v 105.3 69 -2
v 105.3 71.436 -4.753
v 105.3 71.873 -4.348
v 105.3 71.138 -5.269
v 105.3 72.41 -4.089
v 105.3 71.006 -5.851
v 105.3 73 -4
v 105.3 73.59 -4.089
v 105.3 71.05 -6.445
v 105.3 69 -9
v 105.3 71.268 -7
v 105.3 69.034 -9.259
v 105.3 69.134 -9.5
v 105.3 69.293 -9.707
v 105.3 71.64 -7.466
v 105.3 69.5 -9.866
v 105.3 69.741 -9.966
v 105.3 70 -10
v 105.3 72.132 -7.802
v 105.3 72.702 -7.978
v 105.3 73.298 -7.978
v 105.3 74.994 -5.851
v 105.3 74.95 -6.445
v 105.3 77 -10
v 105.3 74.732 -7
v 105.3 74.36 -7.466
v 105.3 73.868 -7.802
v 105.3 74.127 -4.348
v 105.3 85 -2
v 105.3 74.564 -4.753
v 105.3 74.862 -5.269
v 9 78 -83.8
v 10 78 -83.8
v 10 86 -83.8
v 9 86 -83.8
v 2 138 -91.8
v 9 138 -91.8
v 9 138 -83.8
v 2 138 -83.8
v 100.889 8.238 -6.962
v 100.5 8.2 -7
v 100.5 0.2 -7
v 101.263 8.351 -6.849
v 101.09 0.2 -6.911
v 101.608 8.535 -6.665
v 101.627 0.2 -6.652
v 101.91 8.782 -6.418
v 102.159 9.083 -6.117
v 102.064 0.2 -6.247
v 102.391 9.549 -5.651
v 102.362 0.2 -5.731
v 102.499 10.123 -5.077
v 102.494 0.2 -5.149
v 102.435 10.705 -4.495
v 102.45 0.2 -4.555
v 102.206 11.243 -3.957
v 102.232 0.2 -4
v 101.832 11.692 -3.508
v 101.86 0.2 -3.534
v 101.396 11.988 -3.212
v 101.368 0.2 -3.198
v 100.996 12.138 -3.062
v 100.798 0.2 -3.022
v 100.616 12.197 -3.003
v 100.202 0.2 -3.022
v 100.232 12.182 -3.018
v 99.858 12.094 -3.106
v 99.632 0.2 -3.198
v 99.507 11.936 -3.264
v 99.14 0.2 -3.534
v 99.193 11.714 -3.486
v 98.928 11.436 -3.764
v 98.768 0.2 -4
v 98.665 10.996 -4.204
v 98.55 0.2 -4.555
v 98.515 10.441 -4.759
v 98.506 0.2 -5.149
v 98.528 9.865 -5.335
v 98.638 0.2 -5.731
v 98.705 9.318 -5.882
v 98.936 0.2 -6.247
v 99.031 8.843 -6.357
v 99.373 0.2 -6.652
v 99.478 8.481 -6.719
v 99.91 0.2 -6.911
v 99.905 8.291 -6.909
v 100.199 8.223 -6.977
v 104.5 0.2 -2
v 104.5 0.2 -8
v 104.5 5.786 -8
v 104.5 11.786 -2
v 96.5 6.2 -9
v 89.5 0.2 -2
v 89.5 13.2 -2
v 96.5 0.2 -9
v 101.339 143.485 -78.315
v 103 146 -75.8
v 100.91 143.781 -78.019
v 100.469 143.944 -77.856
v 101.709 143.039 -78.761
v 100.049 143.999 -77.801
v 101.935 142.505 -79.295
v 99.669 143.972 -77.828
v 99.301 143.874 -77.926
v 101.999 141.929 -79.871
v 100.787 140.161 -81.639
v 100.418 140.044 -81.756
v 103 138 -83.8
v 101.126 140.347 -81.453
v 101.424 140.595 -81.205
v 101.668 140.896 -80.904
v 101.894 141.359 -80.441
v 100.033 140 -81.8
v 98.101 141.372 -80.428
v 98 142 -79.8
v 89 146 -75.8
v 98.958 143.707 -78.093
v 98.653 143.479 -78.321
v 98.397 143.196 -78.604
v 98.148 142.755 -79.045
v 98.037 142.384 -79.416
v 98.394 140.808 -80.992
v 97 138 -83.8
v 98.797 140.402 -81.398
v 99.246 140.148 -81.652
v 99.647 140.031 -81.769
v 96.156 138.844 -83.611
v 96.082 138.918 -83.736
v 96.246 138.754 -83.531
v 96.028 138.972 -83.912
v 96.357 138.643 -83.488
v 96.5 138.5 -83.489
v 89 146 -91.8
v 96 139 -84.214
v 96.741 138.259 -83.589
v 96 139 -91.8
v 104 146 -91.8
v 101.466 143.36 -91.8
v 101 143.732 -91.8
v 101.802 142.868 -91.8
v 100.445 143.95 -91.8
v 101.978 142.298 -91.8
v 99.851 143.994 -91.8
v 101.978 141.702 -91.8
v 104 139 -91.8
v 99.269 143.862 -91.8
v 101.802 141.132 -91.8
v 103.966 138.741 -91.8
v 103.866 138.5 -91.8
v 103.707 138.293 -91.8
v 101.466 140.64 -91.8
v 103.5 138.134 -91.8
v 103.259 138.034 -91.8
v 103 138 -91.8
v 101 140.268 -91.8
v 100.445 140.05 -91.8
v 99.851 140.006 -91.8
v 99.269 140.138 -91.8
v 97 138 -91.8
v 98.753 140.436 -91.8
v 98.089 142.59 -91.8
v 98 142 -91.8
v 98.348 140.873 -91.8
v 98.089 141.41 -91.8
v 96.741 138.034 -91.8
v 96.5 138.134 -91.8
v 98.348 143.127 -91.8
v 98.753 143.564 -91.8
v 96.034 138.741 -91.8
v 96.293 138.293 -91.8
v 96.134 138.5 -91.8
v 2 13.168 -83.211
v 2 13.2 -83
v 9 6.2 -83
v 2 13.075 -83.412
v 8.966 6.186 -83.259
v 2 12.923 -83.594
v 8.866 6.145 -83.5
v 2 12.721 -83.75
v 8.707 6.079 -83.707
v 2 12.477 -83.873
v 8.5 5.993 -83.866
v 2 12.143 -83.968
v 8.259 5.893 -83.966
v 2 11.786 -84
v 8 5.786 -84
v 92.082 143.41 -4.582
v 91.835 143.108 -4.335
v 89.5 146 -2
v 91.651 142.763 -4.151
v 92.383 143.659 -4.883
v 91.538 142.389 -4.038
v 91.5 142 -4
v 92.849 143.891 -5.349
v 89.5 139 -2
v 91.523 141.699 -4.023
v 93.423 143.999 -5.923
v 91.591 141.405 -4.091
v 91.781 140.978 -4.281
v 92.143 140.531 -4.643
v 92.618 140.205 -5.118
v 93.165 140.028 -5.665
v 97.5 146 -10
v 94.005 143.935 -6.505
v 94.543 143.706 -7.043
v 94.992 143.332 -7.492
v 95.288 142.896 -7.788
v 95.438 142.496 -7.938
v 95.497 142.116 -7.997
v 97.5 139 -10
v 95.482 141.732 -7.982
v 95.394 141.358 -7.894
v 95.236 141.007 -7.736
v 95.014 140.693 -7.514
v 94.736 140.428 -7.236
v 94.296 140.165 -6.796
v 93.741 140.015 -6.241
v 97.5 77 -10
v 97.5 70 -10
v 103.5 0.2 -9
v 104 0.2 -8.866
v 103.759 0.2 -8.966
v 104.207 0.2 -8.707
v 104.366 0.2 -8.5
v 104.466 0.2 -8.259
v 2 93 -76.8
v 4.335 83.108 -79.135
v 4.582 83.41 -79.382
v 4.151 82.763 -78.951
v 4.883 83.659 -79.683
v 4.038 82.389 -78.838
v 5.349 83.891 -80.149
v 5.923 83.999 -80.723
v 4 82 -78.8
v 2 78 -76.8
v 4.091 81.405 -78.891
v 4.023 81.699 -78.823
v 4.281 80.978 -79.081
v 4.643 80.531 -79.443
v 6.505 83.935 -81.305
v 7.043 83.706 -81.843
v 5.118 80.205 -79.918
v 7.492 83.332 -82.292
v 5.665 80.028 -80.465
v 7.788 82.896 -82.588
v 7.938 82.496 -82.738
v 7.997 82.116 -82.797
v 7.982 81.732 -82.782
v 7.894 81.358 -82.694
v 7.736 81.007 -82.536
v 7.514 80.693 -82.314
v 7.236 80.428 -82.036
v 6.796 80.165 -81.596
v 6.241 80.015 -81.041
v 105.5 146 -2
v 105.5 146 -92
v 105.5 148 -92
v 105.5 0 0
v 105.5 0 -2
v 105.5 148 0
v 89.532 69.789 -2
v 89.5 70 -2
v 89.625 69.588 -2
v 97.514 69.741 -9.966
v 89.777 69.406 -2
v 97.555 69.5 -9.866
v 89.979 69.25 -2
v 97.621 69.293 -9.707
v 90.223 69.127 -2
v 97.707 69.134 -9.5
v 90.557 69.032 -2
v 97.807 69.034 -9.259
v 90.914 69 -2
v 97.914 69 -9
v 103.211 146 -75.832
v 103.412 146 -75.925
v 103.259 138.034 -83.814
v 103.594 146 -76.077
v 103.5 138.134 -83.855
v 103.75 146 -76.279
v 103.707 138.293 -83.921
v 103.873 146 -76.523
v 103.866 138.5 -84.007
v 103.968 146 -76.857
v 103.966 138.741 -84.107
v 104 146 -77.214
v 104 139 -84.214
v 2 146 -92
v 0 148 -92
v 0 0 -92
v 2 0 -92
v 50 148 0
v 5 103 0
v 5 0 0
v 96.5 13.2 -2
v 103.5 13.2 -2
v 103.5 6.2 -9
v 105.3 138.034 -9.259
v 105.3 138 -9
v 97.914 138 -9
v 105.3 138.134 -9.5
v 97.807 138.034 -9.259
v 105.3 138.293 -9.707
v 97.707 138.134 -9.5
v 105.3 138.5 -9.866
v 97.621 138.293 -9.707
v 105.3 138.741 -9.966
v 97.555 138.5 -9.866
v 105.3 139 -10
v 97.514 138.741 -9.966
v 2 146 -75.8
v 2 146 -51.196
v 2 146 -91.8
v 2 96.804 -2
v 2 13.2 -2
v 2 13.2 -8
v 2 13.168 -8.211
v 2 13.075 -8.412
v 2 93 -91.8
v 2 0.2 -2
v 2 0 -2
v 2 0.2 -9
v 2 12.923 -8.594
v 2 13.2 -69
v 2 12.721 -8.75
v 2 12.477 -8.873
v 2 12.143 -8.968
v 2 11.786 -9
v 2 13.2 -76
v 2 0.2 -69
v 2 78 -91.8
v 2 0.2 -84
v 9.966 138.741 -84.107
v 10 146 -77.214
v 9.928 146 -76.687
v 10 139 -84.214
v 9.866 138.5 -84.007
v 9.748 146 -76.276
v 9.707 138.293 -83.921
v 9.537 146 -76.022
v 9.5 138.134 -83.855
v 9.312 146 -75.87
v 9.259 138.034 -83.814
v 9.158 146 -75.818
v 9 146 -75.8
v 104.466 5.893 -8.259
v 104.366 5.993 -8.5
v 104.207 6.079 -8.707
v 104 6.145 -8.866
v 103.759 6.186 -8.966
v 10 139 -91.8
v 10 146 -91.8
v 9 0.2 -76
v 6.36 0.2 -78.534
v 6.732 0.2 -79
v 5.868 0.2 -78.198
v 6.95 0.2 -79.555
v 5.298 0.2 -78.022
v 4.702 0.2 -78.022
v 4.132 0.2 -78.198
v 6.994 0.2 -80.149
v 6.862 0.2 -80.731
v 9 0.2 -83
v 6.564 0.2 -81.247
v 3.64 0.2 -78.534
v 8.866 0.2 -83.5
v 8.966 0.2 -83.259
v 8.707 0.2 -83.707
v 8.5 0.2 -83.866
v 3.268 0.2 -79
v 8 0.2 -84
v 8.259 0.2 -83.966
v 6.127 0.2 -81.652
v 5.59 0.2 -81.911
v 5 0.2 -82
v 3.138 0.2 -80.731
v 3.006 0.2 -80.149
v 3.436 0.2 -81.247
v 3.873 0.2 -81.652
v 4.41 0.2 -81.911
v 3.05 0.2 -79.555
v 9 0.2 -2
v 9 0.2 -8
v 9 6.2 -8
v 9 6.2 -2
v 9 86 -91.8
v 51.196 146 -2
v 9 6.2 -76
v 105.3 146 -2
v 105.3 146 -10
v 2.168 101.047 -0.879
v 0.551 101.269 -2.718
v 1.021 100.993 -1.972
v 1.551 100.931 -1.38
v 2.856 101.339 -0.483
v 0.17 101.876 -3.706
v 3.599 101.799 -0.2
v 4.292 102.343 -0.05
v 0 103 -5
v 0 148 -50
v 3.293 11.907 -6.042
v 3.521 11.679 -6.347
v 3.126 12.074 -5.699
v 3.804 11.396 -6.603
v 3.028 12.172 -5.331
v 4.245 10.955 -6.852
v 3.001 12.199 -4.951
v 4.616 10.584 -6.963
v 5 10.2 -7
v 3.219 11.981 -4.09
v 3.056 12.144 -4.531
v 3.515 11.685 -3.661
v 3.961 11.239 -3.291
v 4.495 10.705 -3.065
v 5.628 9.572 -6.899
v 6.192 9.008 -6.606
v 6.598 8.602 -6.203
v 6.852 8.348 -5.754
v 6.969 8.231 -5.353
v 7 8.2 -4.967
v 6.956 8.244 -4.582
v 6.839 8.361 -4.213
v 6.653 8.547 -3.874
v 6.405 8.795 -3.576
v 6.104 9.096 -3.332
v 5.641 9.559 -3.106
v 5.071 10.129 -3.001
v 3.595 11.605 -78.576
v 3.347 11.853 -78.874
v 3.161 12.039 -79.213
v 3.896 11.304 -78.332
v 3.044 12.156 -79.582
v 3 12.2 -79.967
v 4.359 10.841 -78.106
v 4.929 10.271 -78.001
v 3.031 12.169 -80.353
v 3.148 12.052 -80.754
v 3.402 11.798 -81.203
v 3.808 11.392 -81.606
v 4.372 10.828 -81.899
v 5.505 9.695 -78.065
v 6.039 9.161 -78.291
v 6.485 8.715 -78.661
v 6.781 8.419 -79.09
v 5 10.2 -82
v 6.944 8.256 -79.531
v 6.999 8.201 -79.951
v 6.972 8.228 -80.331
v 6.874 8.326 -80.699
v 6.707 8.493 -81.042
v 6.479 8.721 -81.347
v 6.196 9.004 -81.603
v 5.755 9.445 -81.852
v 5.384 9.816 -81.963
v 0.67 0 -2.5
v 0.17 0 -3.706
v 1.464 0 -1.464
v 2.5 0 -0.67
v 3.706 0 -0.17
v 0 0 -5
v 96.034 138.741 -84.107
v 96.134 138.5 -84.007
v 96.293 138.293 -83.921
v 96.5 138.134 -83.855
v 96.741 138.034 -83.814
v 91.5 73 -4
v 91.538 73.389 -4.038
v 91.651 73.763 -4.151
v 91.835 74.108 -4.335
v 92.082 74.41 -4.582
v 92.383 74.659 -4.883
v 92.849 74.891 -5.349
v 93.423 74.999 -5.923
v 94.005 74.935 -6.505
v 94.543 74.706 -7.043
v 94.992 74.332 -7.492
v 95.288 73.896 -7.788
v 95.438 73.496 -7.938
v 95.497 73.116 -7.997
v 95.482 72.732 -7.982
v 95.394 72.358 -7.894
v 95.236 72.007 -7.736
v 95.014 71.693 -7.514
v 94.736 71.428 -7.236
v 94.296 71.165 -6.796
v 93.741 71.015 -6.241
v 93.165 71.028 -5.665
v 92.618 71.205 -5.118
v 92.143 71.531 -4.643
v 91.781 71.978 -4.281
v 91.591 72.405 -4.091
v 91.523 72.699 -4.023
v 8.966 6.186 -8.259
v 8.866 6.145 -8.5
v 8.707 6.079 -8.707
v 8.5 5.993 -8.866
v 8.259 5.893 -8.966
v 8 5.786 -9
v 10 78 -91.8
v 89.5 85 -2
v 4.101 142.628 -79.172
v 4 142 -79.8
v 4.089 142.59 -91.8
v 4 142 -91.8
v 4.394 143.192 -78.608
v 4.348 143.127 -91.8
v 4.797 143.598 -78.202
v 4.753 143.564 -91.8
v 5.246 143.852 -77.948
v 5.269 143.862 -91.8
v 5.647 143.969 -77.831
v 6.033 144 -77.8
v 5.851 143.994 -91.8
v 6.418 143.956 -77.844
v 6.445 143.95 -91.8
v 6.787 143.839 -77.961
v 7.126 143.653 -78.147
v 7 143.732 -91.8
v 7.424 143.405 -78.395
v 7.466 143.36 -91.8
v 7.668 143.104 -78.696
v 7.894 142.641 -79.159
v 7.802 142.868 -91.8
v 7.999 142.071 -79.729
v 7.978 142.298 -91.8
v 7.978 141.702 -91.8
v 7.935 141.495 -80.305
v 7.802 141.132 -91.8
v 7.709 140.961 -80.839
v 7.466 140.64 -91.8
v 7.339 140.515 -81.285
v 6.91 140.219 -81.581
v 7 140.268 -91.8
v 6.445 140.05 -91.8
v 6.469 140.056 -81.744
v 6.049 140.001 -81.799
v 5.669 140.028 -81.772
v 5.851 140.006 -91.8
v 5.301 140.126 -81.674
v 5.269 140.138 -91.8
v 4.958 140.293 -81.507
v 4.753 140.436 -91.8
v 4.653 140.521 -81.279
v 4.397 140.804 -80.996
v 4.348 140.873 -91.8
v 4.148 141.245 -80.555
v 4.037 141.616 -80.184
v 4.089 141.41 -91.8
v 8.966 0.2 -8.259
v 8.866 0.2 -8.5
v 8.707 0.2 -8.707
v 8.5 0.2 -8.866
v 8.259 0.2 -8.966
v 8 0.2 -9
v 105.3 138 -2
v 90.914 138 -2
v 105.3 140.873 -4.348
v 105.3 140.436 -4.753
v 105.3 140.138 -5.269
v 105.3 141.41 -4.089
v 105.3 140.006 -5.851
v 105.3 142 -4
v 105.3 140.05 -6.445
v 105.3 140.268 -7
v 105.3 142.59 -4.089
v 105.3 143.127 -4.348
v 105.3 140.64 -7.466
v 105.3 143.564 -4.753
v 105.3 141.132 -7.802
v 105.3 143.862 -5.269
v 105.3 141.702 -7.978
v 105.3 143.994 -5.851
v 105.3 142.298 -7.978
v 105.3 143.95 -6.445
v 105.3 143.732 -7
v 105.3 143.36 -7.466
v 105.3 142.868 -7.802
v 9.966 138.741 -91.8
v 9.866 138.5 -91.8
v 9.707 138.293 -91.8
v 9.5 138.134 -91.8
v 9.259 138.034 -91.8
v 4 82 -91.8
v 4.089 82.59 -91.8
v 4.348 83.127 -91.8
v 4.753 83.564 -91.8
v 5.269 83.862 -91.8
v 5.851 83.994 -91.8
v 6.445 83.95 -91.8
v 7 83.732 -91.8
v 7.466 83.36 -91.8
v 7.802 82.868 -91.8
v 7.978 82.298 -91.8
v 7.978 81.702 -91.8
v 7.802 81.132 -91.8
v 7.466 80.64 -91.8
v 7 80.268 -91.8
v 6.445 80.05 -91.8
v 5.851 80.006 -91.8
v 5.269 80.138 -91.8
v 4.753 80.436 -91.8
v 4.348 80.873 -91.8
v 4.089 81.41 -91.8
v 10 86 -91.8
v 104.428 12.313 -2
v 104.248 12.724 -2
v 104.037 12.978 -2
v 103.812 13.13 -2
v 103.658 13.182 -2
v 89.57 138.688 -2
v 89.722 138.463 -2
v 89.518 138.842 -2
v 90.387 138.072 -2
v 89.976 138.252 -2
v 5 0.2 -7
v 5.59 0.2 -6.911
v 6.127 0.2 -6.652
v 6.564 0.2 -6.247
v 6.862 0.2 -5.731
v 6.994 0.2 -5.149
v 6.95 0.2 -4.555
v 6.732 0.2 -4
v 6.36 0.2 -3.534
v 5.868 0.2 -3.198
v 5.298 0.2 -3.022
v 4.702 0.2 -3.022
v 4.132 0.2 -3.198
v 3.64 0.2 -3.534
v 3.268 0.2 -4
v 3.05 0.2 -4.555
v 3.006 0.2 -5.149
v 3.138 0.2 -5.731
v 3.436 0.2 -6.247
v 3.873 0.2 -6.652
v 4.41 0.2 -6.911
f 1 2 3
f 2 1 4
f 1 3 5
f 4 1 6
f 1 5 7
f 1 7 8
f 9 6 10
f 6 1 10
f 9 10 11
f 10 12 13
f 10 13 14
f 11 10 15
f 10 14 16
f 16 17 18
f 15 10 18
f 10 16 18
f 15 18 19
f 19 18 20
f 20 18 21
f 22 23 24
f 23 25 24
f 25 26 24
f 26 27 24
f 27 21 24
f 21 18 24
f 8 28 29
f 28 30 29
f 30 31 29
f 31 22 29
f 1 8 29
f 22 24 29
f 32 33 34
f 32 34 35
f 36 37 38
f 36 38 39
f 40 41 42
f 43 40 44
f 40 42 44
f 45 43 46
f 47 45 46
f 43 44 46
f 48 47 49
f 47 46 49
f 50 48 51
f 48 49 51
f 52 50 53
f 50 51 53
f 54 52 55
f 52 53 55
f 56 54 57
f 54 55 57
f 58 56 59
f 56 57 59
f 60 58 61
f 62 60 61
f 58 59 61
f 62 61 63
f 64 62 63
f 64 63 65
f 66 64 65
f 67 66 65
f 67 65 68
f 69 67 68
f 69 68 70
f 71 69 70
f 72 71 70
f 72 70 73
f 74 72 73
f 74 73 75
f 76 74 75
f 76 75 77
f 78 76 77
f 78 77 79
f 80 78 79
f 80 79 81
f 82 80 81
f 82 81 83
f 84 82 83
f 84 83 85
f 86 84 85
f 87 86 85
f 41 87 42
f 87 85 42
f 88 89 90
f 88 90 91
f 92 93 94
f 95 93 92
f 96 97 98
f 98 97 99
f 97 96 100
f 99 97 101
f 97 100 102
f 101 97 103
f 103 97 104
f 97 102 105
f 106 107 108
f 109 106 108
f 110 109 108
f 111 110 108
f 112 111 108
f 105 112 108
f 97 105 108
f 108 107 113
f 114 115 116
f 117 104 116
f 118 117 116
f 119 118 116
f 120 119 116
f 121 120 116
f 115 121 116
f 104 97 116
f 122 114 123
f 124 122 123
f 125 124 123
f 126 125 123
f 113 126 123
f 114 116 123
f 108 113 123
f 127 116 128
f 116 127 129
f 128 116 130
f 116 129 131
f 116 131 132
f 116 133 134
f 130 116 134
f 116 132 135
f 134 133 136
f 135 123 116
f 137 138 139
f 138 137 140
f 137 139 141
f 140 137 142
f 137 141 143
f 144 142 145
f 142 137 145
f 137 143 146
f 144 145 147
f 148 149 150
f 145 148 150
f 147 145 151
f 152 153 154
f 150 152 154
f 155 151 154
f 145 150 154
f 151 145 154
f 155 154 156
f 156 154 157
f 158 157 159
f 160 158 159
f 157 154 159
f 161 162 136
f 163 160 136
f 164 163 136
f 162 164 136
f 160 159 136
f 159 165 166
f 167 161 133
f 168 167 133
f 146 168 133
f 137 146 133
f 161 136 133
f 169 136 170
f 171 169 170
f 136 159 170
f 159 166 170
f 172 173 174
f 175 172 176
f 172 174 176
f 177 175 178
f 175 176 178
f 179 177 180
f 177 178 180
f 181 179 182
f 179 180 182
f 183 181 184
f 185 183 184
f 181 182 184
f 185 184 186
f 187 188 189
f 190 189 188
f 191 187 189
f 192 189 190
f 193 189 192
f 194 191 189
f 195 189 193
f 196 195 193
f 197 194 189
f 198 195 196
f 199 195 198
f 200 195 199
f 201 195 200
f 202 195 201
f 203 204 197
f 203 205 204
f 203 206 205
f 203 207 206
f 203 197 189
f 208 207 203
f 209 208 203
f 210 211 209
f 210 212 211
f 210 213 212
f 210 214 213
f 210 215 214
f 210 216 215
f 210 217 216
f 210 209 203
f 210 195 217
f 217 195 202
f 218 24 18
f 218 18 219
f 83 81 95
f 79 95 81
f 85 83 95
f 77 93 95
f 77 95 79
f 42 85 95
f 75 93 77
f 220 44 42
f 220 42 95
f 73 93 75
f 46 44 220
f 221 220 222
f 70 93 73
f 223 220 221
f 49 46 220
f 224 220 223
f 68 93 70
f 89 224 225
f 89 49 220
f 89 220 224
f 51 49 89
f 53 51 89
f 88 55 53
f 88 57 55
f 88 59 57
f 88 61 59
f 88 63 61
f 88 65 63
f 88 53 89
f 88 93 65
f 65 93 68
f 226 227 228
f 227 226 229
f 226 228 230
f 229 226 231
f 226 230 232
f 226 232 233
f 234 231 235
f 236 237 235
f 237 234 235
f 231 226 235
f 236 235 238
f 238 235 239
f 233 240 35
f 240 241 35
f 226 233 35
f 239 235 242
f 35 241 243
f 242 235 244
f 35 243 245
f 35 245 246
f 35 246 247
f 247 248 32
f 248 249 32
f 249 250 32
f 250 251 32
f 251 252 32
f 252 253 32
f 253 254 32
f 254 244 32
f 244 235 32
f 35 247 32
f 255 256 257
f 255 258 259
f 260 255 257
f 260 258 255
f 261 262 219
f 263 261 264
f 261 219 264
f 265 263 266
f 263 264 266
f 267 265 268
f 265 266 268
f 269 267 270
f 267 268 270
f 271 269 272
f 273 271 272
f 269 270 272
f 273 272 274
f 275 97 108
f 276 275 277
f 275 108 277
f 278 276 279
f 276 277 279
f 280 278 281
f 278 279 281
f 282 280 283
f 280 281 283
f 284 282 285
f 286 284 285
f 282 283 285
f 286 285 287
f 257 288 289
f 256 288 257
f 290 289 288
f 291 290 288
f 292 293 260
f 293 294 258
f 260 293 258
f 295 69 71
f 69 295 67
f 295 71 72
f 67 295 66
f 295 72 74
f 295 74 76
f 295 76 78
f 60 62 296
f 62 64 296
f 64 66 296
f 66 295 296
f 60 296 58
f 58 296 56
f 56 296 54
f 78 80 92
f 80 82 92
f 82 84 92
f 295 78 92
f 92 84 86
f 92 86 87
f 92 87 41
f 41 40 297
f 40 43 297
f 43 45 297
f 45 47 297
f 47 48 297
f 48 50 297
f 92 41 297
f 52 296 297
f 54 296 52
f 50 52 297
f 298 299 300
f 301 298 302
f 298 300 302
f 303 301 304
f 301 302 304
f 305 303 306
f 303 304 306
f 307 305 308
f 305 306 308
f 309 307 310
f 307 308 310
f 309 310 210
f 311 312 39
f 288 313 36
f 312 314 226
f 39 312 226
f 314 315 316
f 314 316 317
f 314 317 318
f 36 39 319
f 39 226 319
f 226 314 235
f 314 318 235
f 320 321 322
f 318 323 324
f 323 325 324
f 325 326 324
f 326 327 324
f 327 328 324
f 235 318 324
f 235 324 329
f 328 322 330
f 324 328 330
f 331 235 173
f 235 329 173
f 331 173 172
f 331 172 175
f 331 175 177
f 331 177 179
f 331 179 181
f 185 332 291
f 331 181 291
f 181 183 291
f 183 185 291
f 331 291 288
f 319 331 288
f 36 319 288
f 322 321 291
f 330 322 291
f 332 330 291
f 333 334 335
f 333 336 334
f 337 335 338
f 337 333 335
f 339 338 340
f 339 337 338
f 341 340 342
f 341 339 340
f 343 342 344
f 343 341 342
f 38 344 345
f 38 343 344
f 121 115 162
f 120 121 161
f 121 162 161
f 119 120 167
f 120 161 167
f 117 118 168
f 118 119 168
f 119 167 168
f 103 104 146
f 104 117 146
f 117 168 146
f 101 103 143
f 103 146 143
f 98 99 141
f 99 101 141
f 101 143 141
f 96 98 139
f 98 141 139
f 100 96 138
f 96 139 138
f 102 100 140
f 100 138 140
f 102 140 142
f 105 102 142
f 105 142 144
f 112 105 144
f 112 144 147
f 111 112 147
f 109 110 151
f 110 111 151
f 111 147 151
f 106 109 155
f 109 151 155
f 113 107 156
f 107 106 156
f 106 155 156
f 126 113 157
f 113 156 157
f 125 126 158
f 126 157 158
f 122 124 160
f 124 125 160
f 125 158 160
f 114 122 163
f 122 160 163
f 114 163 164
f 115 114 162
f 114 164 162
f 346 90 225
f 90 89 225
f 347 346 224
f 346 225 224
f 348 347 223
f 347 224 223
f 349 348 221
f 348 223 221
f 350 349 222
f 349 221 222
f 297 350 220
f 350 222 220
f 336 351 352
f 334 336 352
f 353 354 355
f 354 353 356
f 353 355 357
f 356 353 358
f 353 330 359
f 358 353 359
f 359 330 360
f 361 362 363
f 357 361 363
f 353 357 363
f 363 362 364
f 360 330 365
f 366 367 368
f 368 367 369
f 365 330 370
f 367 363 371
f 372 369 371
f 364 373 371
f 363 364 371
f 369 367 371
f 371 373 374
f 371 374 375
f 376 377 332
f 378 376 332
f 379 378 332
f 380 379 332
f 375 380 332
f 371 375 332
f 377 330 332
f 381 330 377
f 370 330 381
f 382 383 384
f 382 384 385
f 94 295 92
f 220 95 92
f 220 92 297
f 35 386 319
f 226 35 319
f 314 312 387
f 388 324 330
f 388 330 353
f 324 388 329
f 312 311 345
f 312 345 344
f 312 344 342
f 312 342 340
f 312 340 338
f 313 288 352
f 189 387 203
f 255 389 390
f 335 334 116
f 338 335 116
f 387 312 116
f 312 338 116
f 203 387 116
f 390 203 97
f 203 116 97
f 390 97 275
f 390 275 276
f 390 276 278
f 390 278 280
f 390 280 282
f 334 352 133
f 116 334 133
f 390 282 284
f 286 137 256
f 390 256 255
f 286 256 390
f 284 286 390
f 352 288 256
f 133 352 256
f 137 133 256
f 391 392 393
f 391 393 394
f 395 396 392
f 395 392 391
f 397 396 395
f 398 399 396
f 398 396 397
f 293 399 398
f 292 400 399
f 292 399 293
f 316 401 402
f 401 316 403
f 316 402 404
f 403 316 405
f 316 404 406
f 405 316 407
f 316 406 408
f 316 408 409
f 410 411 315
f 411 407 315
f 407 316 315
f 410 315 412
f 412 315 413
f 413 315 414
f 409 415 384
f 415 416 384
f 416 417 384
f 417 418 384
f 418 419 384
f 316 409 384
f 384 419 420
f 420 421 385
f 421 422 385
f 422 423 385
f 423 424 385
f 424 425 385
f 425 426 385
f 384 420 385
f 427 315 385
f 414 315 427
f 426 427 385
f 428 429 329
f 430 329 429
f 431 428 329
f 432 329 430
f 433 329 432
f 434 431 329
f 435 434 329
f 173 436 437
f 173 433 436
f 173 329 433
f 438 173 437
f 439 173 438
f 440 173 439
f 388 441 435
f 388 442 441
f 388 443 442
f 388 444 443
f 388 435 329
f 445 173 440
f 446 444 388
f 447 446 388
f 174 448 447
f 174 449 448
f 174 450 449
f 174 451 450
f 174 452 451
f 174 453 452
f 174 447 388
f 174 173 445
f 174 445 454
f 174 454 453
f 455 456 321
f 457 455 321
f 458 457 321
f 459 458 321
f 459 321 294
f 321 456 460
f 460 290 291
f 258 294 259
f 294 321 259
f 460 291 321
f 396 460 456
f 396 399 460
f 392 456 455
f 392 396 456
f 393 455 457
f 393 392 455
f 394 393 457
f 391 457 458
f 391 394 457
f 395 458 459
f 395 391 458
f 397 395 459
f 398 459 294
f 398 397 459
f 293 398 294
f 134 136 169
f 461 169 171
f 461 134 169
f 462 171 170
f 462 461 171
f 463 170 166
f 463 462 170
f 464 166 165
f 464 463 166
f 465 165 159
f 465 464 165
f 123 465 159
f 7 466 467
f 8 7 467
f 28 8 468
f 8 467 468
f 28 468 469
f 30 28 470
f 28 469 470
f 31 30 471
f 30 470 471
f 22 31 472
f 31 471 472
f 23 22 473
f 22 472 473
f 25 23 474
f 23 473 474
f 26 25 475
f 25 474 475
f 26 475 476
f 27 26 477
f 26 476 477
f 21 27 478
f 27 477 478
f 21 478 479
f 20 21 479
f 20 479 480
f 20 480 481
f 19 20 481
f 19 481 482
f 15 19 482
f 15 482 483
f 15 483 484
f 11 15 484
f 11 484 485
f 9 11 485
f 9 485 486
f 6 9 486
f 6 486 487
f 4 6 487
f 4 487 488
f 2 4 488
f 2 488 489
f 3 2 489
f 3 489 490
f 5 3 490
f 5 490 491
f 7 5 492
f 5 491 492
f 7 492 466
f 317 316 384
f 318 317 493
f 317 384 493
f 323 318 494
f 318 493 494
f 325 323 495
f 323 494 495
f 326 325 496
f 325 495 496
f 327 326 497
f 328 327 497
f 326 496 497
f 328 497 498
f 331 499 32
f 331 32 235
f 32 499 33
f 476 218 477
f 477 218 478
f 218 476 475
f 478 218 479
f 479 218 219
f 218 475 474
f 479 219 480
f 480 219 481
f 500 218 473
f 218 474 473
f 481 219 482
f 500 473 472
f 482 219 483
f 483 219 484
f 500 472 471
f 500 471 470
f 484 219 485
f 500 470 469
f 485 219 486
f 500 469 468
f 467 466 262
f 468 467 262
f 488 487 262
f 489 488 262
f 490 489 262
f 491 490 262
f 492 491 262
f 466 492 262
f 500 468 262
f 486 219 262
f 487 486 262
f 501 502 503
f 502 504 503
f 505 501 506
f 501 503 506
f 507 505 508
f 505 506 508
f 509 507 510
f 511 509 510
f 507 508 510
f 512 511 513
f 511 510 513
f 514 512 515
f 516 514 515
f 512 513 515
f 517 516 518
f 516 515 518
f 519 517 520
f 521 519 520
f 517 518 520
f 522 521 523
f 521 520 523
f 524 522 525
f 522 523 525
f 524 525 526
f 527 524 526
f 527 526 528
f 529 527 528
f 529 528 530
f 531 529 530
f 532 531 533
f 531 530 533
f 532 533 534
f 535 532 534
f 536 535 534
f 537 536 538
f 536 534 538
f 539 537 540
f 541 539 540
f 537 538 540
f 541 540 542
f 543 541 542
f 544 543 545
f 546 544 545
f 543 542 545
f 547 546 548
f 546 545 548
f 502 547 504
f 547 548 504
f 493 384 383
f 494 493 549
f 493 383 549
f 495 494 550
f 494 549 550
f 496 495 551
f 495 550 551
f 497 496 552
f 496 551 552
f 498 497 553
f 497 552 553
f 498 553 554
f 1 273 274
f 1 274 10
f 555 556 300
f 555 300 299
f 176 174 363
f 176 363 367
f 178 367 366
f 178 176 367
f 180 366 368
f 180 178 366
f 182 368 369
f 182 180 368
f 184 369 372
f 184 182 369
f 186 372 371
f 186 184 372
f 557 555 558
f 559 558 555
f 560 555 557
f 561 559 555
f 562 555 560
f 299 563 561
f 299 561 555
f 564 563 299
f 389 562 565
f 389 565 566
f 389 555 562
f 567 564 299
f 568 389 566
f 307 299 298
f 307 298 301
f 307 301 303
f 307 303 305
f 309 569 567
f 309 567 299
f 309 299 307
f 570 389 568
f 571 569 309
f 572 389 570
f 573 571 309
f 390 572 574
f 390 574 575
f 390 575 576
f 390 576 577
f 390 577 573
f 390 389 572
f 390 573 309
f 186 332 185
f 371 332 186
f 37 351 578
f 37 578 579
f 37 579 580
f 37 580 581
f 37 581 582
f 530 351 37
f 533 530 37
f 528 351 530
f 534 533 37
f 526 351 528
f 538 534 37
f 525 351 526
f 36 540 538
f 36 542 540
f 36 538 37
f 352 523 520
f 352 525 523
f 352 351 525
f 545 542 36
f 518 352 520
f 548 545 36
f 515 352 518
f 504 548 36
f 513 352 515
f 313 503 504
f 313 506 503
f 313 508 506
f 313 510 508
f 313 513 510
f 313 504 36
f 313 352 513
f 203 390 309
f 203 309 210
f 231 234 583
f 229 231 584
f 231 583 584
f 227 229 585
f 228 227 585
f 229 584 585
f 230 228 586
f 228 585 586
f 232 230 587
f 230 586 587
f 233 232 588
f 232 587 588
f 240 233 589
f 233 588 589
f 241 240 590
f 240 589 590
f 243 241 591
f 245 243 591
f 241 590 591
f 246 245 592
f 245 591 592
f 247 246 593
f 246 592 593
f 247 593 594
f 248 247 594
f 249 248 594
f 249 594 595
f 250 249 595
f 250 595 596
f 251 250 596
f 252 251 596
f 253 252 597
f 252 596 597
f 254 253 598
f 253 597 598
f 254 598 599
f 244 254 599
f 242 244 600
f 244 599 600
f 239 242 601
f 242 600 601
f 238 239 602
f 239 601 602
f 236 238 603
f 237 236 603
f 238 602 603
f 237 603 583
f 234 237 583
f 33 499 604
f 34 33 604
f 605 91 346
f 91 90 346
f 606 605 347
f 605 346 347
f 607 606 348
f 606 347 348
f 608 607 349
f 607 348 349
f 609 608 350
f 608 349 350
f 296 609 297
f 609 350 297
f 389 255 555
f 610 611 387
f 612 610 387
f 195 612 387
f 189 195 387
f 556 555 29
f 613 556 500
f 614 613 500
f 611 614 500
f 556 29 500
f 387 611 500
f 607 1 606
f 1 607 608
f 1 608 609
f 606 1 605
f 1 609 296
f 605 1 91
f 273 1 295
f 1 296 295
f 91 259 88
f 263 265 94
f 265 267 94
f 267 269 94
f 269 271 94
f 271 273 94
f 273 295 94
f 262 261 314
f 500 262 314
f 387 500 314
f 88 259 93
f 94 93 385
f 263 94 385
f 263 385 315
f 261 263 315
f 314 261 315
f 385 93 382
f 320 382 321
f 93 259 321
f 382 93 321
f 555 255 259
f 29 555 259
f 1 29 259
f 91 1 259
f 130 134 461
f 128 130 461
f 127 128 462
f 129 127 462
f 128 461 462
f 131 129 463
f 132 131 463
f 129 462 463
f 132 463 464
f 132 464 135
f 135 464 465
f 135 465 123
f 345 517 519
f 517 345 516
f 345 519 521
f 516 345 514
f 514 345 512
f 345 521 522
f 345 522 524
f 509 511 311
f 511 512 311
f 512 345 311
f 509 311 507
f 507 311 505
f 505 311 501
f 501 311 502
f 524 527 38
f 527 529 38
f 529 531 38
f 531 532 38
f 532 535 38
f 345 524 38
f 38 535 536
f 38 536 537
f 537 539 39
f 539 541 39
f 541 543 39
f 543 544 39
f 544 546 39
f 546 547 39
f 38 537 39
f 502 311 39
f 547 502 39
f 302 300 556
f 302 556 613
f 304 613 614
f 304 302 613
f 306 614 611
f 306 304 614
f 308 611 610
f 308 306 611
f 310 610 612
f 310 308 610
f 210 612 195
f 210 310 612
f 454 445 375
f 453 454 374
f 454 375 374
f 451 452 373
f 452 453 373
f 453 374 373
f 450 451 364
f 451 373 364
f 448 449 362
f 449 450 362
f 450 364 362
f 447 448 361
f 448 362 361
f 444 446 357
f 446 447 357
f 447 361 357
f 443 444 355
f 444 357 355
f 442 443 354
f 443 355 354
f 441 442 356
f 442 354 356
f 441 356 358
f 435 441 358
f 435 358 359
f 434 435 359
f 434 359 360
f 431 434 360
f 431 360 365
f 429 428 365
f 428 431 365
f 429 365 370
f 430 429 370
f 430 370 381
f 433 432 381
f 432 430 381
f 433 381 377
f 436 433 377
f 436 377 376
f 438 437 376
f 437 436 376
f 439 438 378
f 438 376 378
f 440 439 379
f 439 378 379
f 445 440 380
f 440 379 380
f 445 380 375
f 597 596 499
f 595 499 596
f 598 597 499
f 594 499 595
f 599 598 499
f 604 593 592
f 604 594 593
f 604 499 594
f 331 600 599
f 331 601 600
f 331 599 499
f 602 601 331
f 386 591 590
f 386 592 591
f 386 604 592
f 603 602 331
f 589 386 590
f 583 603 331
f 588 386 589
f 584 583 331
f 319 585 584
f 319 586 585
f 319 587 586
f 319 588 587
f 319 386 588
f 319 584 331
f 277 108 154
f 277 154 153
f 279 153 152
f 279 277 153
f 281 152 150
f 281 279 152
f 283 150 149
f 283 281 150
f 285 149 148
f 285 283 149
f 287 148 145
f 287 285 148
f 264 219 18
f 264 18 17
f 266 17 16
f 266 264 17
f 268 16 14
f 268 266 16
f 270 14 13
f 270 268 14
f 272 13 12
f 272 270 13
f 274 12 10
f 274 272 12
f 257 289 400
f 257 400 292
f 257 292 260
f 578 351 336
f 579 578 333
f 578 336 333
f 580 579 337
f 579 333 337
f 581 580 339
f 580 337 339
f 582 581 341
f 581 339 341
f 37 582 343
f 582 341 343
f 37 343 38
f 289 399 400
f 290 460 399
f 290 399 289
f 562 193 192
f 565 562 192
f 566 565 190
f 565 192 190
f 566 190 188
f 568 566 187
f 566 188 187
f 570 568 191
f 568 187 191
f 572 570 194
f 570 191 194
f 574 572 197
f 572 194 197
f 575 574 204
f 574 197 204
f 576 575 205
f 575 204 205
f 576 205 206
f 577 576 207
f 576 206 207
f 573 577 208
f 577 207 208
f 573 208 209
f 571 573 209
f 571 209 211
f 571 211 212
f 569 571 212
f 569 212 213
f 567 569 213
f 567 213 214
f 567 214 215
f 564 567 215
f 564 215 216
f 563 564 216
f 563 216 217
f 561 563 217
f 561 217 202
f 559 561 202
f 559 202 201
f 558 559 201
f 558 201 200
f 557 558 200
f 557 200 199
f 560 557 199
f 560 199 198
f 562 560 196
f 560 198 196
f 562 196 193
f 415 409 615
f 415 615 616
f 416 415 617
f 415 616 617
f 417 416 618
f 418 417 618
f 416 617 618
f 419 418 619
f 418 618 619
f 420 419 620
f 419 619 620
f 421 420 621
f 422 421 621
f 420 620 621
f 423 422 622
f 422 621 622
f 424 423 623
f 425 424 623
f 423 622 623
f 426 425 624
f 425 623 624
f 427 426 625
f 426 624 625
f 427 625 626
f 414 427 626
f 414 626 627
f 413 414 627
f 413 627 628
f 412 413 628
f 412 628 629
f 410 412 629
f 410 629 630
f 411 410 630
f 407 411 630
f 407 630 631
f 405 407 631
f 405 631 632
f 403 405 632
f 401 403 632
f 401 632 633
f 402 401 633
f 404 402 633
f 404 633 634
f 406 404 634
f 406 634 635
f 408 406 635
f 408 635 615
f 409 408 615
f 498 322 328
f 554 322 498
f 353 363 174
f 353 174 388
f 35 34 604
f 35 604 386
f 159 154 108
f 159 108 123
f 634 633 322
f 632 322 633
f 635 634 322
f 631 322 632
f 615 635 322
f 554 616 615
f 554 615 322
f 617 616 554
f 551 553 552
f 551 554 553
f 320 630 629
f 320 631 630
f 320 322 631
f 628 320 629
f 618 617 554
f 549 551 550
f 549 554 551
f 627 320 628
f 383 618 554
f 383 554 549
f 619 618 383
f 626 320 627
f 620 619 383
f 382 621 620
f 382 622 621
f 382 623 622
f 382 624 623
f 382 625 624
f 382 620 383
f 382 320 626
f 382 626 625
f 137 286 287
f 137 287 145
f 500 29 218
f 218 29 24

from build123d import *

# Parameters (mm, degrees)
BOSS_EXTRUDE1_DEPTH       = 146
SKETCH2_W                 = 105.5
SKETCH2_H                 = 92
BOSS_EXTRUDE2_DEPTH       = 2
BOSS_EXTRUDE3_START       = -0.2
SKETCH3_W                 = 7
SKETCH3_H                 = 8
SKETCH3_R                 = 2
SKETCH3_W_2               = 8
BOSS_EXTRUDE3_DEPTH       = 6
SKETCH4_W                 = 8
SKETCH4_H                 = 8
BOSS_EXTRUDE4_DEPTH       = 8
SKETCH5_W                 = 8
SKETCH5_H                 = 77
CUT_EXTRUDE1_DEPTH        = 0.2
F_4_0MM_DOWEL_HOLE1_D     = 4
F_4_0MM_DOWEL_HOLE1_DEPTH = 7.8
CHAMFER2_SIZE             = 8
BOSS_EXTRUDE5_START       = -0.2
SKETCH9_W                 = 8
SKETCH9_H                 = 8
SKETCH9_R                 = 2
BOSS_EXTRUDE5_DEPTH       = 8
CHAMFER3_SIZE             = 8
CHAMFER1_SIZE             = 7
CHAMFER4_SIZE             = 7
FILLET1_R                 = 1
SKETCH15_R                = 50
CUT_EXTRUDE4_DEPTH        = 219.937395923
BOSS_EXTRUDE7_DEPTH       = 3
FILLET2_R                 = 5


# Some blends are built 0.0001 mm under size
with BuildPart() as part:
    # Sketch1 → Boss-Extrude1 (new body)
    with BuildSketch(Plane(origin=(0, 0, 0), x_dir=(1, 0, 0), z_dir=(0, 1, 0))):
        Polygon((0, 0), (105.5, 0), (105.5, 2), (2, 2), (2, 92), (0, 92), align=None)
    extrude(amount=BOSS_EXTRUDE1_DEPTH)

    # Sketch2 → Boss-Extrude2 (add)
    with BuildSketch(Plane(origin=(0, 146, 0), x_dir=(1, 0, 0), z_dir=(0, 1, 0))):
        with Locations((52.75, 46)):
            Rectangle(SKETCH2_W, SKETCH2_H)
    extrude(amount=BOSS_EXTRUDE2_DEPTH)

    # Sketch3 → Boss-Extrude3 (add)
    # profile 1 of 3: a face of its own
    with BuildSketch(Plane.XZ.offset(BOSS_EXTRUDE3_START)):
        with Locations((5.5, -80)):
            Rectangle(SKETCH3_W, SKETCH3_H)
        with Locations(Location((5, -80, 0), (0, 0, 270))):
            Circle(SKETCH3_R, mode=Mode.SUBTRACT)
    # profile 2 of 3: a face of its own
    with BuildSketch(Plane.XZ.offset(BOSS_EXTRUDE3_START)):
        with Locations((5, -5)):
            Rectangle(SKETCH3_W_2, SKETCH3_H)
        with Locations(Location((5, -5, 0), (0, 0, 270))):
            Circle(SKETCH3_R, mode=Mode.SUBTRACT)
    # profile 3 of 3: a face of its own
    with BuildSketch(Plane.XZ.offset(BOSS_EXTRUDE3_START)):
        with Locations((100.5, -5)):
            Rectangle(SKETCH3_W_2, SKETCH3_H)
        with Locations(Location((100.5, -5, 0), (0, 0, 270))):
            Circle(SKETCH3_R, mode=Mode.SUBTRACT)
    extrude(amount=-BOSS_EXTRUDE3_DEPTH)

    # Sketch4 → Boss-Extrude4 (add)
    with BuildSketch(Plane(origin=(0, 0, -2), x_dir=(-1, 0, 0), z_dir=(0, 0, -1))):
        with Locations((-101.5, 73)):
            Rectangle(SKETCH4_W, SKETCH4_H)
        with Locations((-101.5, 142)):
            Rectangle(SKETCH4_W, SKETCH4_H)
    extrude(amount=BOSS_EXTRUDE4_DEPTH)

    # Sketch5 → Cut-Extrude1 (cut)
    with BuildSketch(Plane(origin=(105.5, 0, 0), x_dir=(0, 0, -1), z_dir=(1, 0, 0))):
        with Locations((6, 107.5)):
            Rectangle(SKETCH5_W, SKETCH5_H)
    extrude(amount=-CUT_EXTRUDE1_DEPTH, mode=Mode.SUBTRACT)

    # Ø4.0mm Dowel Hole1
    with Locations(Plane(origin=(105.3, 0, 0), x_dir=(0, 0, -1), z_dir=(1, 0, 0))):
        with Locations((6, 142), (6, 73)):
            Hole(F_4_0MM_DOWEL_HOLE1_D / 2, depth=F_4_0MM_DOWEL_HOLE1_DEPTH)

    # Chamfer2
    # the kernel refuses this chamfer: 8 mm, written as the material it adds along each edge
    with BuildSketch(Plane(origin=(97.5, 138, -2), x_dir=(-0.9996219169112968, 0, 0.02749587661058654), z_dir=(0, 1, 0))) as chamfer2_piece_1_section:
        Polygon((CHAMFER2_SIZE * 0.999621916911, -CHAMFER2_SIZE * 0.0274958766106), (-CHAMFER2_SIZE * 0.0274958766106, -CHAMFER2_SIZE * 0.999621916911), (0, 0), align=None)
    chamfer2_piece_1 = extrude(amount=8, mode=Mode.PRIVATE)
    chamfer2_piece_1 = split(chamfer2_piece_1, bisect_by=Plane(origin=(90.688027192, 144.666666667, -10), z_dir=(0, 0, 1)), keep=Keep.TOP, mode=Mode.PRIVATE)
    chamfer2_piece_1 = chamfer2_piece_1 - Plane(origin=(90.688027192, 142, -6), x_dir=(0, 0, 1), z_dir=(-1, 0, 0)) * Cylinder(2, 48, mode=Mode.PRIVATE)
    add(chamfer2_piece_1)
    with BuildSketch(Plane(origin=(97.5, 69, -2), x_dir=(-0.9996219169112968, 0, 0.02749587661058654), z_dir=(0, 1, 0))) as chamfer2_piece_2_section:
        Polygon((CHAMFER2_SIZE * 0.999621916911, -CHAMFER2_SIZE * 0.0274958766106), (-CHAMFER2_SIZE * 0.0274958766106, -CHAMFER2_SIZE * 0.999621916911), (0, 0), align=None)
    chamfer2_piece_2 = extrude(amount=8, mode=Mode.PRIVATE)
    chamfer2_piece_2 = split(chamfer2_piece_2, bisect_by=Plane(origin=(90.688027192, 75.666666667, -10), z_dir=(0, 0, 1)), keep=Keep.TOP, mode=Mode.PRIVATE)
    chamfer2_piece_2 = chamfer2_piece_2 - Plane(origin=(90.688027192, 73, -6), x_dir=(0, 0, 1), z_dir=(-1, 0, 0)) * Cylinder(2, 48, mode=Mode.PRIVATE)
    add(chamfer2_piece_2)

    # Sketch9 → Boss-Extrude5 (add)
    # profile 1 of 3: a face of its own
    with BuildSketch(Plane(origin=(0, 0, -92), x_dir=(-1, 0, 0), z_dir=(0, 0, -1)).offset(BOSS_EXTRUDE5_START)):
        with Locations((-6, 142)):
            Rectangle(SKETCH9_W, SKETCH9_H)
        with Locations((-6, 142)):
            Circle(SKETCH9_R, mode=Mode.SUBTRACT)
    # profile 2 of 3: a face of its own
    with BuildSketch(Plane(origin=(0, 0, -92), x_dir=(-1, 0, 0), z_dir=(0, 0, -1)).offset(BOSS_EXTRUDE5_START)):
        with Locations((-100, 142)):
            Rectangle(SKETCH9_W, SKETCH9_H)
        with Locations((-100, 142)):
            Circle(SKETCH9_R, mode=Mode.SUBTRACT)
    # profile 3 of 3: a face of its own
    with BuildSketch(Plane(origin=(0, 0, -92), x_dir=(-1, 0, 0), z_dir=(0, 0, -1)).offset(BOSS_EXTRUDE5_START)):
        with Locations((-6, 82)):
            Rectangle(SKETCH9_W, SKETCH9_H)
        with Locations((-6, 82)):
            Circle(SKETCH9_R, mode=Mode.SUBTRACT)
    extrude(amount=-BOSS_EXTRUDE5_DEPTH)

    # Chamfer3
    # the kernel refuses this chamfer: 8 mm, written as the material it adds along each edge
    with BuildSketch(Plane(origin=(2, 146, -83.8), x_dir=(0, 0.027495876610585647, 0.9996219169112968), z_dir=(1, 0, 0))) as chamfer3_piece_1_section:
        Polygon((CHAMFER3_SIZE * 0.999621916911, CHAMFER3_SIZE * 0.0274958766106), (-CHAMFER3_SIZE * 0.0274958766106, CHAMFER3_SIZE * 0.999621916911), (0, 0), align=None)
    chamfer3_piece_1 = extrude(amount=8, mode=Mode.PRIVATE)
    chamfer3_piece_1 = split(chamfer3_piece_1, bisect_by=Plane(origin=(8.666666667, 138, -76.988027286), z_dir=(0, 1, 0)), keep=Keep.TOP, mode=Mode.PRIVATE)
    chamfer3_piece_1 = chamfer3_piece_1 - Plane(origin=(6, 142, -76.988027286), x_dir=(-1, 0, 0), z_dir=(0, 0, -1)) * Cylinder(2, 48, mode=Mode.PRIVATE)
    add(chamfer3_piece_1)
    with BuildSketch(Plane(origin=(104, 146, -83.8), x_dir=(0, 0.027495876610585647, 0.9996219169112968), z_dir=(-1, 0, 0))) as chamfer3_piece_2_section:
        Polygon((CHAMFER3_SIZE * 0.999621916911, -CHAMFER3_SIZE * 0.0274958766106), (-CHAMFER3_SIZE * 0.0274958766106, -CHAMFER3_SIZE * 0.999621916911), (0, 0), align=None)
    chamfer3_piece_2 = extrude(amount=8, mode=Mode.PRIVATE)
    chamfer3_piece_2 = split(chamfer3_piece_2, bisect_by=Plane(origin=(97.333333333, 138, -76.988027286), z_dir=(0, 1, 0)), keep=Keep.TOP, mode=Mode.PRIVATE)
    chamfer3_piece_2 = chamfer3_piece_2 - Plane(origin=(100, 142, -76.988027286), x_dir=(-1, 0, 0), z_dir=(0, 0, -1)) * Cylinder(2, 48, mode=Mode.PRIVATE)
    add(chamfer3_piece_2)
    with BuildSketch(Plane(origin=(105.3, 77, -2), x_dir=(7.35283608460706e-15, 0.9996219169112968, 0.02749587661058559), z_dir=(-1, 0, 0))) as chamfer3_piece_3_section:
        Polygon((CHAMFER3_SIZE * 0.999621916911, CHAMFER3_SIZE * 0.0274958766106), (-CHAMFER3_SIZE * 0.0274958766106, CHAMFER3_SIZE * 0.999621916911), (0, 0), align=None)
    chamfer3_piece_3 = extrude(amount=36.373463904, mode=Mode.PRIVATE)
    chamfer3_piece_3 = split(chamfer3_piece_3, bisect_by=Plane(origin=(95.192873565, 79.806448266, -7.692873565), z_dir=(0.7071067811868302, 0, 0.7071067811862649)), keep=Keep.TOP, mode=Mode.PRIVATE)
    chamfer3_piece_3 = split(chamfer3_piece_3, bisect_by=Plane(origin=(98.56191571, 79.806448266, -10), z_dir=(0, 0, 1)), keep=Keep.TOP, mode=Mode.PRIVATE)
    add(chamfer3_piece_3)

    # Chamfer1
    chamfer1_edges = [part.edges().sort_by_distance(p)[0] for p in [
        (2, 86, -87.8),
    ]]
    chamfer(chamfer1_edges, length=CHAMFER1_SIZE)
    # the kernel refuses this chamfer: 7 mm, written as the material it adds along each edge
    with BuildSketch(Plane(origin=(104.5, 6.2, -2), x_dir=(0, 0.9996219169112968, 0.02749587661058637), z_dir=(-1, 0, 0))) as chamfer1_2_piece_1_section:
        with BuildLine():
            Line((7.200712366, 0), (-0.395830084, 7.189824555))
            Line((-0.395830084, 7.189824555), (-0.535777153, 7.185975132))
            ThreePointArc((-0.535777153, 7.185975132), (-0.238904589, 3.593784808), (-0.139947068, -0.003849423))
            Line((-0.139947068, -0.003849423), (0.003849423, -0.139947068))
            ThreePointArc((0.003849423, -0.139947068), (3.601483653, -0.040989547), (7.204561789, -0.139947068))
            Line((7.204561789, -0.139947068), (7.200712366, 0))
        make_face()
    chamfer1_2_piece_1 = extrude(amount=8, mode=Mode.PRIVATE)
    chamfer1_2_piece_1 = split(chamfer1_2_piece_1, bisect_by=Plane(origin=(97.833333333, 12.159669312, -9), z_dir=(0, 0, 1)), keep=Keep.TOP, mode=Mode.PRIVATE)
    chamfer1_2_piece_1 = chamfer1_2_piece_1 - Plane(origin=(100.5, 12.159669312, -5), x_dir=(0, 0, -1), z_dir=(0, -1, 0)) * Cylinder(2, 45, mode=Mode.PRIVATE)
    add(chamfer1_2_piece_1)
    # the kernel refuses this chamfer: 7 mm, written as the material it adds along each edge
    with BuildSketch(Plane(origin=(2, 6.2, -84), x_dir=(-0.027495876610586556, 0.9996219169112968, 0), z_dir=(0, 0, 1))) as chamfer1_3_piece_1_section:
        with BuildLine():
            Line((7.200712366, 0), (-0.395830084, -7.189824555))
            Line((-0.395830084, -7.189824555), (-0.535777153, -7.185975132))
            ThreePointArc((-0.535777153, -7.185975132), (-0.238904589, -3.593784808), (-0.139947068, 0.003849423))
            Line((-0.139947068, 0.003849423), (0.003849423, 0.139947068))
            ThreePointArc((0.003849423, 0.139947068), (3.601483653, 0.040989547), (7.204561789, 0.139947068))
            Line((7.204561789, 0.139947068), (7.200712366, 0))
        make_face()
    chamfer1_3_piece_1 = extrude(amount=8, mode=Mode.PRIVATE)
    chamfer1_3_piece_1 = split(chamfer1_3_piece_1, bisect_by=Plane(origin=(9, 12.159669426, -77.333333333), z_dir=(-1, 0, 0)), keep=Keep.TOP, mode=Mode.PRIVATE)
    chamfer1_3_piece_1 = chamfer1_3_piece_1 - Plane(origin=(5, 12.159669426, -80), x_dir=(0, 0, -1), z_dir=(0, -1, 0)) * Cylinder(2, 45, mode=Mode.PRIVATE)
    add(chamfer1_3_piece_1)
    # the kernel refuses this chamfer: 7 mm, written as the material it adds along each edge
    with BuildSketch(Plane(origin=(2, 6.2, -2), x_dir=(-0.02749587661058637, 0.9996219169112968, 0), z_dir=(0, 0, -1))) as chamfer1_4_piece_1_section:
        with BuildLine():
            Line((7.200712366, 0), (-0.395830084, 7.189824555))
            Line((-0.395830084, 7.189824555), (-0.535777153, 7.185975132))
            ThreePointArc((-0.535777153, 7.185975132), (-0.238904589, 3.593784808), (-0.139947068, -0.003849423))
            Line((-0.139947068, -0.003849423), (0.003849423, -0.139947068))
            ThreePointArc((0.003849423, -0.139947068), (3.601483653, -0.040989547), (7.204561789, -0.139947068))
            Line((7.204561789, -0.139947068), (7.200712366, 0))
        make_face()
    chamfer1_4_piece_1 = extrude(amount=7, mode=Mode.PRIVATE)
    chamfer1_4_piece_1 = split(chamfer1_4_piece_1, bisect_by=Plane(origin=(9, 12.161920808, -7.833333333), z_dir=(-1, 0, 0)), keep=Keep.TOP, mode=Mode.PRIVATE)
    chamfer1_4_piece_1 = chamfer1_4_piece_1 - Plane(origin=(5, 12.161920808, -5), x_dir=(0, 0, -1), z_dir=(0, -1, 0)) * Cylinder(2, 43, mode=Mode.PRIVATE)
    add(chamfer1_4_piece_1)

    # Chamfer4
    # the kernel refuses this chamfer: 7 mm, written as the material it adds along each edge
    with BuildSketch(Plane(origin=(2, 31.201780916, -76), x_dir=(-0.027495876610586403, -2.1873373005352424e-15, 0.9996219169112968), z_dir=(0, -1, 0))) as chamfer4_piece_1_section:
        Polygon((CHAMFER4_SIZE * 0.999621916911, -CHAMFER4_SIZE * 0.0274958766106), (-CHAMFER4_SIZE * 0.0274958766106, -CHAMFER4_SIZE * 0.999621916911), (0, 0), align=None)
    chamfer4_piece_1 = extrude(amount=31.001780916, mode=Mode.PRIVATE)
    chamfer4_piece_1 = split(chamfer4_piece_1, bisect_by=Plane(origin=(6.759568818, 8.440431182, -73.53334602), z_dir=(-0.707106781186299, -0.7071067811867962, 0)), keep=Keep.TOP, mode=Mode.PRIVATE)
    chamfer4_piece_1 = split(chamfer4_piece_1, bisect_by=Plane(origin=(9, 5.693620788, -73.53334602), z_dir=(-1, 0, 0)), keep=Keep.TOP, mode=Mode.PRIVATE)
    add(chamfer4_piece_1)
    with BuildSketch(Plane(origin=(96.5, 0.2, -2), x_dir=(-0.9996219169112968, 4.370447847260361e-15, 0.02749587661058656), z_dir=(0, 1, 0))) as chamfer4_piece_2_section:
        Polygon((CHAMFER4_SIZE * 0.999621916911, -CHAMFER4_SIZE * 0.0274958766106), (-CHAMFER4_SIZE * 0.0274958766106, -CHAMFER4_SIZE * 0.999621916911), (0, 0), align=None)
    chamfer4_piece_2 = extrude(amount=31.001780916, mode=Mode.PRIVATE)
    chamfer4_piece_2 = split(chamfer4_piece_2, bisect_by=Plane(origin=(94.03334602, 8.440431182, -6.759568818), z_dir=(0, -0.7071067811867962, 0.707106781186299)), keep=Keep.TOP, mode=Mode.PRIVATE)
    chamfer4_piece_2 = split(chamfer4_piece_2, bisect_by=Plane(origin=(94.03334602, 5.693620788, -9), z_dir=(0, 0, 1)), keep=Keep.TOP, mode=Mode.PRIVATE)
    add(chamfer4_piece_2)
    with BuildSketch(Plane(origin=(96, 146, -91.8), x_dir=(-0.9996219169112968, 0.027495876610586126, -1.967830739555515e-15), z_dir=(0, 0, 1))) as chamfer4_piece_3_section:
        Polygon((CHAMFER4_SIZE * 0.999621916911, CHAMFER4_SIZE * 0.0274958766106), (-CHAMFER4_SIZE * 0.0274958766106, CHAMFER4_SIZE * 0.999621916911), (0, 0), align=None)
    chamfer4_piece_3 = extrude(amount=34.001780916, mode=Mode.PRIVATE)
    chamfer4_piece_3 = split(chamfer4_piece_3, bisect_by=Plane(origin=(93.569946265, 140.439034316, -81.360965684), z_dir=(0, 0.7071067811862649, -0.7071067811868302)), keep=Keep.TOP, mode=Mode.PRIVATE)
    add(chamfer4_piece_3)
    with BuildSketch(Plane(origin=(2, 78, -83.8), x_dir=(-0.027495876610586497, 0, 0.9996219169112968), z_dir=(0, 1, 0))) as chamfer4_piece_4_section:
        Polygon((CHAMFER4_SIZE * 0.999621916911, CHAMFER4_SIZE * 0.0274958766106), (-CHAMFER4_SIZE * 0.0274958766106, CHAMFER4_SIZE * 0.999621916911), (0, 0), align=None)
    chamfer4_piece_4 = extrude(amount=33.001780916, mode=Mode.PRIVATE)
    chamfer4_piece_4 = split(chamfer4_piece_4, bisect_by=Plane(origin=(8.497935299, 86.502064701, -81.32656752), z_dir=(-0.7071067811865476, -0.7071067811865476, 0)), keep=Keep.TOP, mode=Mode.PRIVATE)
    chamfer4_piece_4 = split(chamfer4_piece_4, bisect_by=Plane(origin=(3.995792094, 86, -81.32656752), z_dir=(0, -1, 0)), keep=Keep.TOP, mode=Mode.PRIVATE)
    chamfer4_piece_4 = chamfer4_piece_4 - Plane(origin=(6, 82, -81.32656752), x_dir=(-1, 0, 0), z_dir=(0, 0, -1)) * Cylinder(2, 94, mode=Mode.PRIVATE)
    add(chamfer4_piece_4)
    with BuildSketch(Plane(origin=(2, 78, -83.8), x_dir=(-0.027495876610586497, 0, 0.9996219169112968), z_dir=(0, 1, 0))) as chamfer4_piece_5_section:
        Polygon((CHAMFER4_SIZE * 0.999621916911, CHAMFER4_SIZE * 0.0274958766106), (-CHAMFER4_SIZE * 0.0274958766106, CHAMFER4_SIZE * 0.999621916911), (0, 0), align=None)
    chamfer4_piece_5 = extrude(amount=33.001780916, mode=Mode.PRIVATE)
    chamfer4_piece_5 = split(chamfer4_piece_5, bisect_by=Plane(origin=(4.984102881, 90.015897119, -81.136955408), z_dir=(-0.7071067811865476, -0.7071067811865476, 0)), keep=Keep.TOP, mode=Mode.PRIVATE)
    chamfer4_piece_5 = split(chamfer4_piece_5, bisect_by=Plane(origin=(3.645470507, 86, -81.136955408), z_dir=(0, 1, 0)), keep=Keep.TOP, mode=Mode.PRIVATE)
    add(chamfer4_piece_5)

    # Fillet1
    fillet1_edges = [part.edges().sort_by_distance(p)[0] for p in [
        (9, 3.2, -84),
        (5.5, 9.7, -84),
        (9, 3.2, -9),
        (104.5, 3.2, -9),
        (104.5, 9.7, -5.5),
        (5.5, 9.7, -9),
        (93.5, 138, -6),
        (101.4, 138, -10),
        (101.4, 69, -10),
        (93.5, 69, -6),
        (96, 138.5, -83.3),
        (96, 138, -87.8),
        (104, 142, -79.8),
        (104, 138, -87.8),
        (10, 142, -79.8),
        (10, 138, -87.8),
    ]]
    fillet(fillet1_edges, radius=FILLET1_R - 0.0001)  # a hair under: the kernel refuses the full size

    # Sketch15 → Cut-Extrude4 (cut, through all)
    with BuildSketch(Plane(origin=(-32.666666667, 32.666666667, 32.666666667), x_dir=(0.8164965809277261, 0.408248290463863, 0.408248290463863), z_dir=(-0.5773502691896257, 0.5773502691896258, 0.5773502691896258))):
        with Locations((60.420746989, 104.651803616)):
            Circle(SKETCH15_R)
    extrude(amount=CUT_EXTRUDE4_DEPTH, mode=Mode.SUBTRACT)

    # Sketch16 → Boss-Extrude7 (add)
    with BuildSketch(Plane(origin=(-32.666666667, 32.666666667, 32.666666667), x_dir=(0.40824829046386274, -0.40824829046386296, 0.8164965809277264), z_dir=(-0.5773502691896258, 0.5773502691896262, 0.5773502691896255))):
        Polygon((-101.245576035, 104.651803616), (-40.008332465, 69.296464556), (-40.008332465, 140.007142675), align=None)
    extrude(amount=-BOSS_EXTRUDE7_DEPTH)

    # Fillet2
    fillet2_edges = [part.edges().sort_by_distance(p)[0] for p in [
        (0, 49, 0),
    ]]
    fillet(fillet2_edges, radius=FILLET2_R)


solid = part.part
